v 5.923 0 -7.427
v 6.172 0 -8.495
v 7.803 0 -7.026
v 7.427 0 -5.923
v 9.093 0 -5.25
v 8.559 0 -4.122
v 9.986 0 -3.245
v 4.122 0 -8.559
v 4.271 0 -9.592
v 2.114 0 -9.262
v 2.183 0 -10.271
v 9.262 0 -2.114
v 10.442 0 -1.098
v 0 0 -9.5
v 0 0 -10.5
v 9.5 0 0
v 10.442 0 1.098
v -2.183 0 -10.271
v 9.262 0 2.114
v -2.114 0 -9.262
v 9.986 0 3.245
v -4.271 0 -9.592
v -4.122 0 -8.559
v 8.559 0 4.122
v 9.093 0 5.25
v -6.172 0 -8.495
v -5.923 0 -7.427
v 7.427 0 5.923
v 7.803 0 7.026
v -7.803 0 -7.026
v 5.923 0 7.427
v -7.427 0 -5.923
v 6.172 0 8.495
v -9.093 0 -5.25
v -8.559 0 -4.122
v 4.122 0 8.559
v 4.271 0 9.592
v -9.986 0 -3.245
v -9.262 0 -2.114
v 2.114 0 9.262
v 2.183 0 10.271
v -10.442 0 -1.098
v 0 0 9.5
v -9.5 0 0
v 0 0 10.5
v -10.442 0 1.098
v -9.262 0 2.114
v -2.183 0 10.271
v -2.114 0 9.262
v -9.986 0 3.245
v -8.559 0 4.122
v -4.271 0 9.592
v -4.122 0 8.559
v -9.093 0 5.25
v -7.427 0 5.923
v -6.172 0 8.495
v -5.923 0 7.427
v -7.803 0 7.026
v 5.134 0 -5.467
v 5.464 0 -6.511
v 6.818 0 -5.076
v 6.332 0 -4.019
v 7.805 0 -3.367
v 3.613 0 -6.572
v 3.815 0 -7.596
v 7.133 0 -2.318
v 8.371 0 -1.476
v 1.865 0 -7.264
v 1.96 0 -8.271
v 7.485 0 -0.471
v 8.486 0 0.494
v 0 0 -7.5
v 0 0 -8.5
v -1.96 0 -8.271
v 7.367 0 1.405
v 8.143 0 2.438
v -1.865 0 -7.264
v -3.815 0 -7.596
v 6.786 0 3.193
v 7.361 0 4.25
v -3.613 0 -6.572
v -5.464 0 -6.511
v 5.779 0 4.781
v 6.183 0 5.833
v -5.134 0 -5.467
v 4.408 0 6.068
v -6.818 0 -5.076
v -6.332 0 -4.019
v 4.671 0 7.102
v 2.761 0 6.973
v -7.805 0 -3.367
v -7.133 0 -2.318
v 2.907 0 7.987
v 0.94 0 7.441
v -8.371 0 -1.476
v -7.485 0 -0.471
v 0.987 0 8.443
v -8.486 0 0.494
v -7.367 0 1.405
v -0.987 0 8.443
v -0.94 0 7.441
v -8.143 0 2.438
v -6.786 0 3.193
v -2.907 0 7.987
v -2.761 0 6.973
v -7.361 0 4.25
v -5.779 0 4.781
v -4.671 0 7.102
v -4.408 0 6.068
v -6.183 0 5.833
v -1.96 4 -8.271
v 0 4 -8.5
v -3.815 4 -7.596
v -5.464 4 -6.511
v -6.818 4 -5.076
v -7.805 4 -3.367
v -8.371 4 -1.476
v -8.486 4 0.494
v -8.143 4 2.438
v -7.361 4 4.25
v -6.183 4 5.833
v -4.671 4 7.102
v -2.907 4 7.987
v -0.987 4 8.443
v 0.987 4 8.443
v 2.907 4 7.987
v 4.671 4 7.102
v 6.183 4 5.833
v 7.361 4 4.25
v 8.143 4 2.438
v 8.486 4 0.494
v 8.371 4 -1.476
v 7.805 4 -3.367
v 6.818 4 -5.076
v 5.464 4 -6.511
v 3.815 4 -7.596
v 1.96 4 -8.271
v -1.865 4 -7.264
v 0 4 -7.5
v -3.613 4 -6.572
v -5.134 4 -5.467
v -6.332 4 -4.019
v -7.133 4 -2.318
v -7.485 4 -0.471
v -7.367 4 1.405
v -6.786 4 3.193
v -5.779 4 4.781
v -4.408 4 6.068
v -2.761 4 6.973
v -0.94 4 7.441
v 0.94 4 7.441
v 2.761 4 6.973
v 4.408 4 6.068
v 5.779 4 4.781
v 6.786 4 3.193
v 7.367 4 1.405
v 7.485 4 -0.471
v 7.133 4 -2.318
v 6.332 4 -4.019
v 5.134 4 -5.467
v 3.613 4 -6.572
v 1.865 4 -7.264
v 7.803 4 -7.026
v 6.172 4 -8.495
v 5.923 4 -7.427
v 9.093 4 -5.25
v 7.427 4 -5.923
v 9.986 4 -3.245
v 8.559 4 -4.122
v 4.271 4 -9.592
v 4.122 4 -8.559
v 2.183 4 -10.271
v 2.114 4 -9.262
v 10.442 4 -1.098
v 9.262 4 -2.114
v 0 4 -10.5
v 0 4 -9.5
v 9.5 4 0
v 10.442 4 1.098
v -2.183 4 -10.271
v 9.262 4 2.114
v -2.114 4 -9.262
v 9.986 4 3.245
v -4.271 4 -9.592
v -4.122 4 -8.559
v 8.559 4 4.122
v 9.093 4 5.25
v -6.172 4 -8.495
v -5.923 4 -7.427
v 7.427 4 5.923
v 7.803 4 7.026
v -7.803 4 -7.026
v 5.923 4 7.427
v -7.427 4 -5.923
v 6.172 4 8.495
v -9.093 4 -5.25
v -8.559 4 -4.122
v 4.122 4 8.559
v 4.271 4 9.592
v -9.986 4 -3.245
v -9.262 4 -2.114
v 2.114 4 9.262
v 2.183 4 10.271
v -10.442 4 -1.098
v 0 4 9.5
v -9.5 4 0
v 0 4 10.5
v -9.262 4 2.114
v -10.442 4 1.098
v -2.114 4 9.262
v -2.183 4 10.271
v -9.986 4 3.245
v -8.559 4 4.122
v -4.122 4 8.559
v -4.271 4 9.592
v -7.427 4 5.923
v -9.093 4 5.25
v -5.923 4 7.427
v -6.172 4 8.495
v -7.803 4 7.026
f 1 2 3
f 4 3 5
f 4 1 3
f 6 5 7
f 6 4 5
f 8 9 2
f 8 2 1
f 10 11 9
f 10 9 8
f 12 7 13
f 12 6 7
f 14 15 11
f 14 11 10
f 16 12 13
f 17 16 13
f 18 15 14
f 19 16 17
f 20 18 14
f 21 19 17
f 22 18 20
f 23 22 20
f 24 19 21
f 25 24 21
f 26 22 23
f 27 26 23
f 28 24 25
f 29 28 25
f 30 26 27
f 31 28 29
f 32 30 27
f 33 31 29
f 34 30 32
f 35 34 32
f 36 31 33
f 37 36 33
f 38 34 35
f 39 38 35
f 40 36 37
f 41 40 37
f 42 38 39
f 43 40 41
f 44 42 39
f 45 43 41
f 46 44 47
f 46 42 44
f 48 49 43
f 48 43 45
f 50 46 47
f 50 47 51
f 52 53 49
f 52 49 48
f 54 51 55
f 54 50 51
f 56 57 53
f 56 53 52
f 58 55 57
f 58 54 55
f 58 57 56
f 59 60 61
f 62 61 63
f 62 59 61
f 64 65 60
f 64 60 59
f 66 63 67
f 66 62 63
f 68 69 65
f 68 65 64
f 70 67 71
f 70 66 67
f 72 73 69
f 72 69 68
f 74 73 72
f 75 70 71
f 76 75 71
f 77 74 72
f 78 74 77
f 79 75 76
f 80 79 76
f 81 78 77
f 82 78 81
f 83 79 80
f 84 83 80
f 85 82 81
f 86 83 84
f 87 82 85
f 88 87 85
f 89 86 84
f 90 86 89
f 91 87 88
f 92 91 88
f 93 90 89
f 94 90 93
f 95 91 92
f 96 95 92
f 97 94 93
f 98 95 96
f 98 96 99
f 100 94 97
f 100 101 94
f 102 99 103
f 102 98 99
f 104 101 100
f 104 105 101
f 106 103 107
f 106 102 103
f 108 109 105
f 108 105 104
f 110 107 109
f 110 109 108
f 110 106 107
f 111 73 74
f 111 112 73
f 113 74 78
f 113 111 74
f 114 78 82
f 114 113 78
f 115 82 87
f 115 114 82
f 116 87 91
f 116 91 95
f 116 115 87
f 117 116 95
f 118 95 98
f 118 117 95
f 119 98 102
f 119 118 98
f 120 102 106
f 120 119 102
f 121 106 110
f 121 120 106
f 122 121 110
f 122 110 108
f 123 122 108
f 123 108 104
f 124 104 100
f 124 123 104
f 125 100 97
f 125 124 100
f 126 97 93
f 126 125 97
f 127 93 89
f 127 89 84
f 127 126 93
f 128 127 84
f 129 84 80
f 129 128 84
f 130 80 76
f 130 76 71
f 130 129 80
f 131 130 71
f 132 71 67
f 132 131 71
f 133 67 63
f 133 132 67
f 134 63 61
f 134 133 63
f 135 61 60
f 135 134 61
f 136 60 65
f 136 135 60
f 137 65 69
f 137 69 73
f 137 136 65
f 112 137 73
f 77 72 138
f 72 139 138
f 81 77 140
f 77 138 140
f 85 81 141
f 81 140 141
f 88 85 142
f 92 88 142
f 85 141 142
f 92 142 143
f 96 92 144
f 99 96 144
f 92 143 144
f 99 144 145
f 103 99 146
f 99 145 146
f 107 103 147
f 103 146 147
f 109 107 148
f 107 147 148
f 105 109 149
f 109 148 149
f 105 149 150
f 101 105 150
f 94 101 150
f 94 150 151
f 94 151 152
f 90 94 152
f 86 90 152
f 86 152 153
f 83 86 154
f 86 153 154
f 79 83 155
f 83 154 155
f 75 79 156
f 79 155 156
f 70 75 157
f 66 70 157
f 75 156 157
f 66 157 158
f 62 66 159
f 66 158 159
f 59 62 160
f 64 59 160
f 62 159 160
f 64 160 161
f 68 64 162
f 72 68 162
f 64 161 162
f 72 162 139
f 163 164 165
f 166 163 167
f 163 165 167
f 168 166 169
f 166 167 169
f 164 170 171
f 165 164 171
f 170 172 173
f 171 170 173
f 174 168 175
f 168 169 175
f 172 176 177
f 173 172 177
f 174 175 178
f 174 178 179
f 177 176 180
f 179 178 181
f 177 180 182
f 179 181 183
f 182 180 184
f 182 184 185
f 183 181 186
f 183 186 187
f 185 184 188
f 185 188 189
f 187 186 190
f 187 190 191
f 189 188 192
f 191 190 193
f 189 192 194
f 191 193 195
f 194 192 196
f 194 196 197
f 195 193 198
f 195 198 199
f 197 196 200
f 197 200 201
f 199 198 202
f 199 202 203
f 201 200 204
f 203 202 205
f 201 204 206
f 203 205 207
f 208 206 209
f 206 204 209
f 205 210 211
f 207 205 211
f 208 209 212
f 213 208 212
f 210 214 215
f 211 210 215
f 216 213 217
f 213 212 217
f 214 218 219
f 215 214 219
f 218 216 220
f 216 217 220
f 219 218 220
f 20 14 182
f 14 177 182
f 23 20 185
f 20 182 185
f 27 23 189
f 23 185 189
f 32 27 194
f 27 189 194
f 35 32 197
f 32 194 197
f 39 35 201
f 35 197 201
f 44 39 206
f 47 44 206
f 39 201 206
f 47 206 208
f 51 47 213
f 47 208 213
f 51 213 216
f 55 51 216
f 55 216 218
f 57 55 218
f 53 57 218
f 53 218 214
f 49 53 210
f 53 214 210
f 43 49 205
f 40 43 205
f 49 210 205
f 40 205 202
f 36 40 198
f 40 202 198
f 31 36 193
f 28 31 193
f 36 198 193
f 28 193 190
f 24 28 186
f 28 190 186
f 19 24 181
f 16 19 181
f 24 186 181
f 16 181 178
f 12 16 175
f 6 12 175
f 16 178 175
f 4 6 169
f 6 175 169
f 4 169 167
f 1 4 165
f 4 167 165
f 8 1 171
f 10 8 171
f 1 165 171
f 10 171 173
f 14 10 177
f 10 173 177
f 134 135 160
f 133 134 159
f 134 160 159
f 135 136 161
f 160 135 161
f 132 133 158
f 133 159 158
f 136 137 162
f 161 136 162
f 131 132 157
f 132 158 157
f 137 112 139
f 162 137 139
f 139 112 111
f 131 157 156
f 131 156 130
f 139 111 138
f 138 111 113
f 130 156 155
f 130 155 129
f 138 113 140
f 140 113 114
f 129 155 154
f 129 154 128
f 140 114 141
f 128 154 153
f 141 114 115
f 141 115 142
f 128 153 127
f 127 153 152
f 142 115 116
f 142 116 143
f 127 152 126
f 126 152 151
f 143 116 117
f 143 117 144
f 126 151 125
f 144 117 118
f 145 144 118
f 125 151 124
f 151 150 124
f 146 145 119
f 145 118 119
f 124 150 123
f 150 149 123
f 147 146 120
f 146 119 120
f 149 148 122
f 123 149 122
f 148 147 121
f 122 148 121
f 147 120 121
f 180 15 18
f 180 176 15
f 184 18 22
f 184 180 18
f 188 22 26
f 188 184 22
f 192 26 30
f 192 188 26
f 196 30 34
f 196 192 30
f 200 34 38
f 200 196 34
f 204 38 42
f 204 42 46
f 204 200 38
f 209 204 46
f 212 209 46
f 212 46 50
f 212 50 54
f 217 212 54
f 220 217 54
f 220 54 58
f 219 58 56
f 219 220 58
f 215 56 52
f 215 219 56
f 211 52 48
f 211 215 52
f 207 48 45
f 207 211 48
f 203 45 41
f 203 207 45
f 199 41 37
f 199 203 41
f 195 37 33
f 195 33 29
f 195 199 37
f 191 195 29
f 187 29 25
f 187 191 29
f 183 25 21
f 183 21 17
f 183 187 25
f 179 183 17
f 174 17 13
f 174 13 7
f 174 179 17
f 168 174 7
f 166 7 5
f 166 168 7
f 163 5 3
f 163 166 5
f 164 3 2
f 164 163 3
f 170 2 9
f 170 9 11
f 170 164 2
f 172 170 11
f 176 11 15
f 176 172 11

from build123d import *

# Parameters (mm, degrees)
ESQUISSE2_W = 1
ESQUISSE2_H = 4


with BuildPart() as part:
    # Esquisse2 → Révolution1 (revolve)
    with BuildSketch(Plane.XY, mode=Mode.PRIVATE) as r_volution1_sk:
        with Locations((8, 2)):
            Rectangle(ESQUISSE2_W, ESQUISSE2_H)
        with Locations((10, 2)):
            Rectangle(ESQUISSE2_W, ESQUISSE2_H)
    revolve(r_volution1_sk.sketch.rotate(Axis((0, 0, 0), (0, 1, 0)), 90), axis=Axis((0, 0, 0), (0, 1, 0)))


solid = part.part
